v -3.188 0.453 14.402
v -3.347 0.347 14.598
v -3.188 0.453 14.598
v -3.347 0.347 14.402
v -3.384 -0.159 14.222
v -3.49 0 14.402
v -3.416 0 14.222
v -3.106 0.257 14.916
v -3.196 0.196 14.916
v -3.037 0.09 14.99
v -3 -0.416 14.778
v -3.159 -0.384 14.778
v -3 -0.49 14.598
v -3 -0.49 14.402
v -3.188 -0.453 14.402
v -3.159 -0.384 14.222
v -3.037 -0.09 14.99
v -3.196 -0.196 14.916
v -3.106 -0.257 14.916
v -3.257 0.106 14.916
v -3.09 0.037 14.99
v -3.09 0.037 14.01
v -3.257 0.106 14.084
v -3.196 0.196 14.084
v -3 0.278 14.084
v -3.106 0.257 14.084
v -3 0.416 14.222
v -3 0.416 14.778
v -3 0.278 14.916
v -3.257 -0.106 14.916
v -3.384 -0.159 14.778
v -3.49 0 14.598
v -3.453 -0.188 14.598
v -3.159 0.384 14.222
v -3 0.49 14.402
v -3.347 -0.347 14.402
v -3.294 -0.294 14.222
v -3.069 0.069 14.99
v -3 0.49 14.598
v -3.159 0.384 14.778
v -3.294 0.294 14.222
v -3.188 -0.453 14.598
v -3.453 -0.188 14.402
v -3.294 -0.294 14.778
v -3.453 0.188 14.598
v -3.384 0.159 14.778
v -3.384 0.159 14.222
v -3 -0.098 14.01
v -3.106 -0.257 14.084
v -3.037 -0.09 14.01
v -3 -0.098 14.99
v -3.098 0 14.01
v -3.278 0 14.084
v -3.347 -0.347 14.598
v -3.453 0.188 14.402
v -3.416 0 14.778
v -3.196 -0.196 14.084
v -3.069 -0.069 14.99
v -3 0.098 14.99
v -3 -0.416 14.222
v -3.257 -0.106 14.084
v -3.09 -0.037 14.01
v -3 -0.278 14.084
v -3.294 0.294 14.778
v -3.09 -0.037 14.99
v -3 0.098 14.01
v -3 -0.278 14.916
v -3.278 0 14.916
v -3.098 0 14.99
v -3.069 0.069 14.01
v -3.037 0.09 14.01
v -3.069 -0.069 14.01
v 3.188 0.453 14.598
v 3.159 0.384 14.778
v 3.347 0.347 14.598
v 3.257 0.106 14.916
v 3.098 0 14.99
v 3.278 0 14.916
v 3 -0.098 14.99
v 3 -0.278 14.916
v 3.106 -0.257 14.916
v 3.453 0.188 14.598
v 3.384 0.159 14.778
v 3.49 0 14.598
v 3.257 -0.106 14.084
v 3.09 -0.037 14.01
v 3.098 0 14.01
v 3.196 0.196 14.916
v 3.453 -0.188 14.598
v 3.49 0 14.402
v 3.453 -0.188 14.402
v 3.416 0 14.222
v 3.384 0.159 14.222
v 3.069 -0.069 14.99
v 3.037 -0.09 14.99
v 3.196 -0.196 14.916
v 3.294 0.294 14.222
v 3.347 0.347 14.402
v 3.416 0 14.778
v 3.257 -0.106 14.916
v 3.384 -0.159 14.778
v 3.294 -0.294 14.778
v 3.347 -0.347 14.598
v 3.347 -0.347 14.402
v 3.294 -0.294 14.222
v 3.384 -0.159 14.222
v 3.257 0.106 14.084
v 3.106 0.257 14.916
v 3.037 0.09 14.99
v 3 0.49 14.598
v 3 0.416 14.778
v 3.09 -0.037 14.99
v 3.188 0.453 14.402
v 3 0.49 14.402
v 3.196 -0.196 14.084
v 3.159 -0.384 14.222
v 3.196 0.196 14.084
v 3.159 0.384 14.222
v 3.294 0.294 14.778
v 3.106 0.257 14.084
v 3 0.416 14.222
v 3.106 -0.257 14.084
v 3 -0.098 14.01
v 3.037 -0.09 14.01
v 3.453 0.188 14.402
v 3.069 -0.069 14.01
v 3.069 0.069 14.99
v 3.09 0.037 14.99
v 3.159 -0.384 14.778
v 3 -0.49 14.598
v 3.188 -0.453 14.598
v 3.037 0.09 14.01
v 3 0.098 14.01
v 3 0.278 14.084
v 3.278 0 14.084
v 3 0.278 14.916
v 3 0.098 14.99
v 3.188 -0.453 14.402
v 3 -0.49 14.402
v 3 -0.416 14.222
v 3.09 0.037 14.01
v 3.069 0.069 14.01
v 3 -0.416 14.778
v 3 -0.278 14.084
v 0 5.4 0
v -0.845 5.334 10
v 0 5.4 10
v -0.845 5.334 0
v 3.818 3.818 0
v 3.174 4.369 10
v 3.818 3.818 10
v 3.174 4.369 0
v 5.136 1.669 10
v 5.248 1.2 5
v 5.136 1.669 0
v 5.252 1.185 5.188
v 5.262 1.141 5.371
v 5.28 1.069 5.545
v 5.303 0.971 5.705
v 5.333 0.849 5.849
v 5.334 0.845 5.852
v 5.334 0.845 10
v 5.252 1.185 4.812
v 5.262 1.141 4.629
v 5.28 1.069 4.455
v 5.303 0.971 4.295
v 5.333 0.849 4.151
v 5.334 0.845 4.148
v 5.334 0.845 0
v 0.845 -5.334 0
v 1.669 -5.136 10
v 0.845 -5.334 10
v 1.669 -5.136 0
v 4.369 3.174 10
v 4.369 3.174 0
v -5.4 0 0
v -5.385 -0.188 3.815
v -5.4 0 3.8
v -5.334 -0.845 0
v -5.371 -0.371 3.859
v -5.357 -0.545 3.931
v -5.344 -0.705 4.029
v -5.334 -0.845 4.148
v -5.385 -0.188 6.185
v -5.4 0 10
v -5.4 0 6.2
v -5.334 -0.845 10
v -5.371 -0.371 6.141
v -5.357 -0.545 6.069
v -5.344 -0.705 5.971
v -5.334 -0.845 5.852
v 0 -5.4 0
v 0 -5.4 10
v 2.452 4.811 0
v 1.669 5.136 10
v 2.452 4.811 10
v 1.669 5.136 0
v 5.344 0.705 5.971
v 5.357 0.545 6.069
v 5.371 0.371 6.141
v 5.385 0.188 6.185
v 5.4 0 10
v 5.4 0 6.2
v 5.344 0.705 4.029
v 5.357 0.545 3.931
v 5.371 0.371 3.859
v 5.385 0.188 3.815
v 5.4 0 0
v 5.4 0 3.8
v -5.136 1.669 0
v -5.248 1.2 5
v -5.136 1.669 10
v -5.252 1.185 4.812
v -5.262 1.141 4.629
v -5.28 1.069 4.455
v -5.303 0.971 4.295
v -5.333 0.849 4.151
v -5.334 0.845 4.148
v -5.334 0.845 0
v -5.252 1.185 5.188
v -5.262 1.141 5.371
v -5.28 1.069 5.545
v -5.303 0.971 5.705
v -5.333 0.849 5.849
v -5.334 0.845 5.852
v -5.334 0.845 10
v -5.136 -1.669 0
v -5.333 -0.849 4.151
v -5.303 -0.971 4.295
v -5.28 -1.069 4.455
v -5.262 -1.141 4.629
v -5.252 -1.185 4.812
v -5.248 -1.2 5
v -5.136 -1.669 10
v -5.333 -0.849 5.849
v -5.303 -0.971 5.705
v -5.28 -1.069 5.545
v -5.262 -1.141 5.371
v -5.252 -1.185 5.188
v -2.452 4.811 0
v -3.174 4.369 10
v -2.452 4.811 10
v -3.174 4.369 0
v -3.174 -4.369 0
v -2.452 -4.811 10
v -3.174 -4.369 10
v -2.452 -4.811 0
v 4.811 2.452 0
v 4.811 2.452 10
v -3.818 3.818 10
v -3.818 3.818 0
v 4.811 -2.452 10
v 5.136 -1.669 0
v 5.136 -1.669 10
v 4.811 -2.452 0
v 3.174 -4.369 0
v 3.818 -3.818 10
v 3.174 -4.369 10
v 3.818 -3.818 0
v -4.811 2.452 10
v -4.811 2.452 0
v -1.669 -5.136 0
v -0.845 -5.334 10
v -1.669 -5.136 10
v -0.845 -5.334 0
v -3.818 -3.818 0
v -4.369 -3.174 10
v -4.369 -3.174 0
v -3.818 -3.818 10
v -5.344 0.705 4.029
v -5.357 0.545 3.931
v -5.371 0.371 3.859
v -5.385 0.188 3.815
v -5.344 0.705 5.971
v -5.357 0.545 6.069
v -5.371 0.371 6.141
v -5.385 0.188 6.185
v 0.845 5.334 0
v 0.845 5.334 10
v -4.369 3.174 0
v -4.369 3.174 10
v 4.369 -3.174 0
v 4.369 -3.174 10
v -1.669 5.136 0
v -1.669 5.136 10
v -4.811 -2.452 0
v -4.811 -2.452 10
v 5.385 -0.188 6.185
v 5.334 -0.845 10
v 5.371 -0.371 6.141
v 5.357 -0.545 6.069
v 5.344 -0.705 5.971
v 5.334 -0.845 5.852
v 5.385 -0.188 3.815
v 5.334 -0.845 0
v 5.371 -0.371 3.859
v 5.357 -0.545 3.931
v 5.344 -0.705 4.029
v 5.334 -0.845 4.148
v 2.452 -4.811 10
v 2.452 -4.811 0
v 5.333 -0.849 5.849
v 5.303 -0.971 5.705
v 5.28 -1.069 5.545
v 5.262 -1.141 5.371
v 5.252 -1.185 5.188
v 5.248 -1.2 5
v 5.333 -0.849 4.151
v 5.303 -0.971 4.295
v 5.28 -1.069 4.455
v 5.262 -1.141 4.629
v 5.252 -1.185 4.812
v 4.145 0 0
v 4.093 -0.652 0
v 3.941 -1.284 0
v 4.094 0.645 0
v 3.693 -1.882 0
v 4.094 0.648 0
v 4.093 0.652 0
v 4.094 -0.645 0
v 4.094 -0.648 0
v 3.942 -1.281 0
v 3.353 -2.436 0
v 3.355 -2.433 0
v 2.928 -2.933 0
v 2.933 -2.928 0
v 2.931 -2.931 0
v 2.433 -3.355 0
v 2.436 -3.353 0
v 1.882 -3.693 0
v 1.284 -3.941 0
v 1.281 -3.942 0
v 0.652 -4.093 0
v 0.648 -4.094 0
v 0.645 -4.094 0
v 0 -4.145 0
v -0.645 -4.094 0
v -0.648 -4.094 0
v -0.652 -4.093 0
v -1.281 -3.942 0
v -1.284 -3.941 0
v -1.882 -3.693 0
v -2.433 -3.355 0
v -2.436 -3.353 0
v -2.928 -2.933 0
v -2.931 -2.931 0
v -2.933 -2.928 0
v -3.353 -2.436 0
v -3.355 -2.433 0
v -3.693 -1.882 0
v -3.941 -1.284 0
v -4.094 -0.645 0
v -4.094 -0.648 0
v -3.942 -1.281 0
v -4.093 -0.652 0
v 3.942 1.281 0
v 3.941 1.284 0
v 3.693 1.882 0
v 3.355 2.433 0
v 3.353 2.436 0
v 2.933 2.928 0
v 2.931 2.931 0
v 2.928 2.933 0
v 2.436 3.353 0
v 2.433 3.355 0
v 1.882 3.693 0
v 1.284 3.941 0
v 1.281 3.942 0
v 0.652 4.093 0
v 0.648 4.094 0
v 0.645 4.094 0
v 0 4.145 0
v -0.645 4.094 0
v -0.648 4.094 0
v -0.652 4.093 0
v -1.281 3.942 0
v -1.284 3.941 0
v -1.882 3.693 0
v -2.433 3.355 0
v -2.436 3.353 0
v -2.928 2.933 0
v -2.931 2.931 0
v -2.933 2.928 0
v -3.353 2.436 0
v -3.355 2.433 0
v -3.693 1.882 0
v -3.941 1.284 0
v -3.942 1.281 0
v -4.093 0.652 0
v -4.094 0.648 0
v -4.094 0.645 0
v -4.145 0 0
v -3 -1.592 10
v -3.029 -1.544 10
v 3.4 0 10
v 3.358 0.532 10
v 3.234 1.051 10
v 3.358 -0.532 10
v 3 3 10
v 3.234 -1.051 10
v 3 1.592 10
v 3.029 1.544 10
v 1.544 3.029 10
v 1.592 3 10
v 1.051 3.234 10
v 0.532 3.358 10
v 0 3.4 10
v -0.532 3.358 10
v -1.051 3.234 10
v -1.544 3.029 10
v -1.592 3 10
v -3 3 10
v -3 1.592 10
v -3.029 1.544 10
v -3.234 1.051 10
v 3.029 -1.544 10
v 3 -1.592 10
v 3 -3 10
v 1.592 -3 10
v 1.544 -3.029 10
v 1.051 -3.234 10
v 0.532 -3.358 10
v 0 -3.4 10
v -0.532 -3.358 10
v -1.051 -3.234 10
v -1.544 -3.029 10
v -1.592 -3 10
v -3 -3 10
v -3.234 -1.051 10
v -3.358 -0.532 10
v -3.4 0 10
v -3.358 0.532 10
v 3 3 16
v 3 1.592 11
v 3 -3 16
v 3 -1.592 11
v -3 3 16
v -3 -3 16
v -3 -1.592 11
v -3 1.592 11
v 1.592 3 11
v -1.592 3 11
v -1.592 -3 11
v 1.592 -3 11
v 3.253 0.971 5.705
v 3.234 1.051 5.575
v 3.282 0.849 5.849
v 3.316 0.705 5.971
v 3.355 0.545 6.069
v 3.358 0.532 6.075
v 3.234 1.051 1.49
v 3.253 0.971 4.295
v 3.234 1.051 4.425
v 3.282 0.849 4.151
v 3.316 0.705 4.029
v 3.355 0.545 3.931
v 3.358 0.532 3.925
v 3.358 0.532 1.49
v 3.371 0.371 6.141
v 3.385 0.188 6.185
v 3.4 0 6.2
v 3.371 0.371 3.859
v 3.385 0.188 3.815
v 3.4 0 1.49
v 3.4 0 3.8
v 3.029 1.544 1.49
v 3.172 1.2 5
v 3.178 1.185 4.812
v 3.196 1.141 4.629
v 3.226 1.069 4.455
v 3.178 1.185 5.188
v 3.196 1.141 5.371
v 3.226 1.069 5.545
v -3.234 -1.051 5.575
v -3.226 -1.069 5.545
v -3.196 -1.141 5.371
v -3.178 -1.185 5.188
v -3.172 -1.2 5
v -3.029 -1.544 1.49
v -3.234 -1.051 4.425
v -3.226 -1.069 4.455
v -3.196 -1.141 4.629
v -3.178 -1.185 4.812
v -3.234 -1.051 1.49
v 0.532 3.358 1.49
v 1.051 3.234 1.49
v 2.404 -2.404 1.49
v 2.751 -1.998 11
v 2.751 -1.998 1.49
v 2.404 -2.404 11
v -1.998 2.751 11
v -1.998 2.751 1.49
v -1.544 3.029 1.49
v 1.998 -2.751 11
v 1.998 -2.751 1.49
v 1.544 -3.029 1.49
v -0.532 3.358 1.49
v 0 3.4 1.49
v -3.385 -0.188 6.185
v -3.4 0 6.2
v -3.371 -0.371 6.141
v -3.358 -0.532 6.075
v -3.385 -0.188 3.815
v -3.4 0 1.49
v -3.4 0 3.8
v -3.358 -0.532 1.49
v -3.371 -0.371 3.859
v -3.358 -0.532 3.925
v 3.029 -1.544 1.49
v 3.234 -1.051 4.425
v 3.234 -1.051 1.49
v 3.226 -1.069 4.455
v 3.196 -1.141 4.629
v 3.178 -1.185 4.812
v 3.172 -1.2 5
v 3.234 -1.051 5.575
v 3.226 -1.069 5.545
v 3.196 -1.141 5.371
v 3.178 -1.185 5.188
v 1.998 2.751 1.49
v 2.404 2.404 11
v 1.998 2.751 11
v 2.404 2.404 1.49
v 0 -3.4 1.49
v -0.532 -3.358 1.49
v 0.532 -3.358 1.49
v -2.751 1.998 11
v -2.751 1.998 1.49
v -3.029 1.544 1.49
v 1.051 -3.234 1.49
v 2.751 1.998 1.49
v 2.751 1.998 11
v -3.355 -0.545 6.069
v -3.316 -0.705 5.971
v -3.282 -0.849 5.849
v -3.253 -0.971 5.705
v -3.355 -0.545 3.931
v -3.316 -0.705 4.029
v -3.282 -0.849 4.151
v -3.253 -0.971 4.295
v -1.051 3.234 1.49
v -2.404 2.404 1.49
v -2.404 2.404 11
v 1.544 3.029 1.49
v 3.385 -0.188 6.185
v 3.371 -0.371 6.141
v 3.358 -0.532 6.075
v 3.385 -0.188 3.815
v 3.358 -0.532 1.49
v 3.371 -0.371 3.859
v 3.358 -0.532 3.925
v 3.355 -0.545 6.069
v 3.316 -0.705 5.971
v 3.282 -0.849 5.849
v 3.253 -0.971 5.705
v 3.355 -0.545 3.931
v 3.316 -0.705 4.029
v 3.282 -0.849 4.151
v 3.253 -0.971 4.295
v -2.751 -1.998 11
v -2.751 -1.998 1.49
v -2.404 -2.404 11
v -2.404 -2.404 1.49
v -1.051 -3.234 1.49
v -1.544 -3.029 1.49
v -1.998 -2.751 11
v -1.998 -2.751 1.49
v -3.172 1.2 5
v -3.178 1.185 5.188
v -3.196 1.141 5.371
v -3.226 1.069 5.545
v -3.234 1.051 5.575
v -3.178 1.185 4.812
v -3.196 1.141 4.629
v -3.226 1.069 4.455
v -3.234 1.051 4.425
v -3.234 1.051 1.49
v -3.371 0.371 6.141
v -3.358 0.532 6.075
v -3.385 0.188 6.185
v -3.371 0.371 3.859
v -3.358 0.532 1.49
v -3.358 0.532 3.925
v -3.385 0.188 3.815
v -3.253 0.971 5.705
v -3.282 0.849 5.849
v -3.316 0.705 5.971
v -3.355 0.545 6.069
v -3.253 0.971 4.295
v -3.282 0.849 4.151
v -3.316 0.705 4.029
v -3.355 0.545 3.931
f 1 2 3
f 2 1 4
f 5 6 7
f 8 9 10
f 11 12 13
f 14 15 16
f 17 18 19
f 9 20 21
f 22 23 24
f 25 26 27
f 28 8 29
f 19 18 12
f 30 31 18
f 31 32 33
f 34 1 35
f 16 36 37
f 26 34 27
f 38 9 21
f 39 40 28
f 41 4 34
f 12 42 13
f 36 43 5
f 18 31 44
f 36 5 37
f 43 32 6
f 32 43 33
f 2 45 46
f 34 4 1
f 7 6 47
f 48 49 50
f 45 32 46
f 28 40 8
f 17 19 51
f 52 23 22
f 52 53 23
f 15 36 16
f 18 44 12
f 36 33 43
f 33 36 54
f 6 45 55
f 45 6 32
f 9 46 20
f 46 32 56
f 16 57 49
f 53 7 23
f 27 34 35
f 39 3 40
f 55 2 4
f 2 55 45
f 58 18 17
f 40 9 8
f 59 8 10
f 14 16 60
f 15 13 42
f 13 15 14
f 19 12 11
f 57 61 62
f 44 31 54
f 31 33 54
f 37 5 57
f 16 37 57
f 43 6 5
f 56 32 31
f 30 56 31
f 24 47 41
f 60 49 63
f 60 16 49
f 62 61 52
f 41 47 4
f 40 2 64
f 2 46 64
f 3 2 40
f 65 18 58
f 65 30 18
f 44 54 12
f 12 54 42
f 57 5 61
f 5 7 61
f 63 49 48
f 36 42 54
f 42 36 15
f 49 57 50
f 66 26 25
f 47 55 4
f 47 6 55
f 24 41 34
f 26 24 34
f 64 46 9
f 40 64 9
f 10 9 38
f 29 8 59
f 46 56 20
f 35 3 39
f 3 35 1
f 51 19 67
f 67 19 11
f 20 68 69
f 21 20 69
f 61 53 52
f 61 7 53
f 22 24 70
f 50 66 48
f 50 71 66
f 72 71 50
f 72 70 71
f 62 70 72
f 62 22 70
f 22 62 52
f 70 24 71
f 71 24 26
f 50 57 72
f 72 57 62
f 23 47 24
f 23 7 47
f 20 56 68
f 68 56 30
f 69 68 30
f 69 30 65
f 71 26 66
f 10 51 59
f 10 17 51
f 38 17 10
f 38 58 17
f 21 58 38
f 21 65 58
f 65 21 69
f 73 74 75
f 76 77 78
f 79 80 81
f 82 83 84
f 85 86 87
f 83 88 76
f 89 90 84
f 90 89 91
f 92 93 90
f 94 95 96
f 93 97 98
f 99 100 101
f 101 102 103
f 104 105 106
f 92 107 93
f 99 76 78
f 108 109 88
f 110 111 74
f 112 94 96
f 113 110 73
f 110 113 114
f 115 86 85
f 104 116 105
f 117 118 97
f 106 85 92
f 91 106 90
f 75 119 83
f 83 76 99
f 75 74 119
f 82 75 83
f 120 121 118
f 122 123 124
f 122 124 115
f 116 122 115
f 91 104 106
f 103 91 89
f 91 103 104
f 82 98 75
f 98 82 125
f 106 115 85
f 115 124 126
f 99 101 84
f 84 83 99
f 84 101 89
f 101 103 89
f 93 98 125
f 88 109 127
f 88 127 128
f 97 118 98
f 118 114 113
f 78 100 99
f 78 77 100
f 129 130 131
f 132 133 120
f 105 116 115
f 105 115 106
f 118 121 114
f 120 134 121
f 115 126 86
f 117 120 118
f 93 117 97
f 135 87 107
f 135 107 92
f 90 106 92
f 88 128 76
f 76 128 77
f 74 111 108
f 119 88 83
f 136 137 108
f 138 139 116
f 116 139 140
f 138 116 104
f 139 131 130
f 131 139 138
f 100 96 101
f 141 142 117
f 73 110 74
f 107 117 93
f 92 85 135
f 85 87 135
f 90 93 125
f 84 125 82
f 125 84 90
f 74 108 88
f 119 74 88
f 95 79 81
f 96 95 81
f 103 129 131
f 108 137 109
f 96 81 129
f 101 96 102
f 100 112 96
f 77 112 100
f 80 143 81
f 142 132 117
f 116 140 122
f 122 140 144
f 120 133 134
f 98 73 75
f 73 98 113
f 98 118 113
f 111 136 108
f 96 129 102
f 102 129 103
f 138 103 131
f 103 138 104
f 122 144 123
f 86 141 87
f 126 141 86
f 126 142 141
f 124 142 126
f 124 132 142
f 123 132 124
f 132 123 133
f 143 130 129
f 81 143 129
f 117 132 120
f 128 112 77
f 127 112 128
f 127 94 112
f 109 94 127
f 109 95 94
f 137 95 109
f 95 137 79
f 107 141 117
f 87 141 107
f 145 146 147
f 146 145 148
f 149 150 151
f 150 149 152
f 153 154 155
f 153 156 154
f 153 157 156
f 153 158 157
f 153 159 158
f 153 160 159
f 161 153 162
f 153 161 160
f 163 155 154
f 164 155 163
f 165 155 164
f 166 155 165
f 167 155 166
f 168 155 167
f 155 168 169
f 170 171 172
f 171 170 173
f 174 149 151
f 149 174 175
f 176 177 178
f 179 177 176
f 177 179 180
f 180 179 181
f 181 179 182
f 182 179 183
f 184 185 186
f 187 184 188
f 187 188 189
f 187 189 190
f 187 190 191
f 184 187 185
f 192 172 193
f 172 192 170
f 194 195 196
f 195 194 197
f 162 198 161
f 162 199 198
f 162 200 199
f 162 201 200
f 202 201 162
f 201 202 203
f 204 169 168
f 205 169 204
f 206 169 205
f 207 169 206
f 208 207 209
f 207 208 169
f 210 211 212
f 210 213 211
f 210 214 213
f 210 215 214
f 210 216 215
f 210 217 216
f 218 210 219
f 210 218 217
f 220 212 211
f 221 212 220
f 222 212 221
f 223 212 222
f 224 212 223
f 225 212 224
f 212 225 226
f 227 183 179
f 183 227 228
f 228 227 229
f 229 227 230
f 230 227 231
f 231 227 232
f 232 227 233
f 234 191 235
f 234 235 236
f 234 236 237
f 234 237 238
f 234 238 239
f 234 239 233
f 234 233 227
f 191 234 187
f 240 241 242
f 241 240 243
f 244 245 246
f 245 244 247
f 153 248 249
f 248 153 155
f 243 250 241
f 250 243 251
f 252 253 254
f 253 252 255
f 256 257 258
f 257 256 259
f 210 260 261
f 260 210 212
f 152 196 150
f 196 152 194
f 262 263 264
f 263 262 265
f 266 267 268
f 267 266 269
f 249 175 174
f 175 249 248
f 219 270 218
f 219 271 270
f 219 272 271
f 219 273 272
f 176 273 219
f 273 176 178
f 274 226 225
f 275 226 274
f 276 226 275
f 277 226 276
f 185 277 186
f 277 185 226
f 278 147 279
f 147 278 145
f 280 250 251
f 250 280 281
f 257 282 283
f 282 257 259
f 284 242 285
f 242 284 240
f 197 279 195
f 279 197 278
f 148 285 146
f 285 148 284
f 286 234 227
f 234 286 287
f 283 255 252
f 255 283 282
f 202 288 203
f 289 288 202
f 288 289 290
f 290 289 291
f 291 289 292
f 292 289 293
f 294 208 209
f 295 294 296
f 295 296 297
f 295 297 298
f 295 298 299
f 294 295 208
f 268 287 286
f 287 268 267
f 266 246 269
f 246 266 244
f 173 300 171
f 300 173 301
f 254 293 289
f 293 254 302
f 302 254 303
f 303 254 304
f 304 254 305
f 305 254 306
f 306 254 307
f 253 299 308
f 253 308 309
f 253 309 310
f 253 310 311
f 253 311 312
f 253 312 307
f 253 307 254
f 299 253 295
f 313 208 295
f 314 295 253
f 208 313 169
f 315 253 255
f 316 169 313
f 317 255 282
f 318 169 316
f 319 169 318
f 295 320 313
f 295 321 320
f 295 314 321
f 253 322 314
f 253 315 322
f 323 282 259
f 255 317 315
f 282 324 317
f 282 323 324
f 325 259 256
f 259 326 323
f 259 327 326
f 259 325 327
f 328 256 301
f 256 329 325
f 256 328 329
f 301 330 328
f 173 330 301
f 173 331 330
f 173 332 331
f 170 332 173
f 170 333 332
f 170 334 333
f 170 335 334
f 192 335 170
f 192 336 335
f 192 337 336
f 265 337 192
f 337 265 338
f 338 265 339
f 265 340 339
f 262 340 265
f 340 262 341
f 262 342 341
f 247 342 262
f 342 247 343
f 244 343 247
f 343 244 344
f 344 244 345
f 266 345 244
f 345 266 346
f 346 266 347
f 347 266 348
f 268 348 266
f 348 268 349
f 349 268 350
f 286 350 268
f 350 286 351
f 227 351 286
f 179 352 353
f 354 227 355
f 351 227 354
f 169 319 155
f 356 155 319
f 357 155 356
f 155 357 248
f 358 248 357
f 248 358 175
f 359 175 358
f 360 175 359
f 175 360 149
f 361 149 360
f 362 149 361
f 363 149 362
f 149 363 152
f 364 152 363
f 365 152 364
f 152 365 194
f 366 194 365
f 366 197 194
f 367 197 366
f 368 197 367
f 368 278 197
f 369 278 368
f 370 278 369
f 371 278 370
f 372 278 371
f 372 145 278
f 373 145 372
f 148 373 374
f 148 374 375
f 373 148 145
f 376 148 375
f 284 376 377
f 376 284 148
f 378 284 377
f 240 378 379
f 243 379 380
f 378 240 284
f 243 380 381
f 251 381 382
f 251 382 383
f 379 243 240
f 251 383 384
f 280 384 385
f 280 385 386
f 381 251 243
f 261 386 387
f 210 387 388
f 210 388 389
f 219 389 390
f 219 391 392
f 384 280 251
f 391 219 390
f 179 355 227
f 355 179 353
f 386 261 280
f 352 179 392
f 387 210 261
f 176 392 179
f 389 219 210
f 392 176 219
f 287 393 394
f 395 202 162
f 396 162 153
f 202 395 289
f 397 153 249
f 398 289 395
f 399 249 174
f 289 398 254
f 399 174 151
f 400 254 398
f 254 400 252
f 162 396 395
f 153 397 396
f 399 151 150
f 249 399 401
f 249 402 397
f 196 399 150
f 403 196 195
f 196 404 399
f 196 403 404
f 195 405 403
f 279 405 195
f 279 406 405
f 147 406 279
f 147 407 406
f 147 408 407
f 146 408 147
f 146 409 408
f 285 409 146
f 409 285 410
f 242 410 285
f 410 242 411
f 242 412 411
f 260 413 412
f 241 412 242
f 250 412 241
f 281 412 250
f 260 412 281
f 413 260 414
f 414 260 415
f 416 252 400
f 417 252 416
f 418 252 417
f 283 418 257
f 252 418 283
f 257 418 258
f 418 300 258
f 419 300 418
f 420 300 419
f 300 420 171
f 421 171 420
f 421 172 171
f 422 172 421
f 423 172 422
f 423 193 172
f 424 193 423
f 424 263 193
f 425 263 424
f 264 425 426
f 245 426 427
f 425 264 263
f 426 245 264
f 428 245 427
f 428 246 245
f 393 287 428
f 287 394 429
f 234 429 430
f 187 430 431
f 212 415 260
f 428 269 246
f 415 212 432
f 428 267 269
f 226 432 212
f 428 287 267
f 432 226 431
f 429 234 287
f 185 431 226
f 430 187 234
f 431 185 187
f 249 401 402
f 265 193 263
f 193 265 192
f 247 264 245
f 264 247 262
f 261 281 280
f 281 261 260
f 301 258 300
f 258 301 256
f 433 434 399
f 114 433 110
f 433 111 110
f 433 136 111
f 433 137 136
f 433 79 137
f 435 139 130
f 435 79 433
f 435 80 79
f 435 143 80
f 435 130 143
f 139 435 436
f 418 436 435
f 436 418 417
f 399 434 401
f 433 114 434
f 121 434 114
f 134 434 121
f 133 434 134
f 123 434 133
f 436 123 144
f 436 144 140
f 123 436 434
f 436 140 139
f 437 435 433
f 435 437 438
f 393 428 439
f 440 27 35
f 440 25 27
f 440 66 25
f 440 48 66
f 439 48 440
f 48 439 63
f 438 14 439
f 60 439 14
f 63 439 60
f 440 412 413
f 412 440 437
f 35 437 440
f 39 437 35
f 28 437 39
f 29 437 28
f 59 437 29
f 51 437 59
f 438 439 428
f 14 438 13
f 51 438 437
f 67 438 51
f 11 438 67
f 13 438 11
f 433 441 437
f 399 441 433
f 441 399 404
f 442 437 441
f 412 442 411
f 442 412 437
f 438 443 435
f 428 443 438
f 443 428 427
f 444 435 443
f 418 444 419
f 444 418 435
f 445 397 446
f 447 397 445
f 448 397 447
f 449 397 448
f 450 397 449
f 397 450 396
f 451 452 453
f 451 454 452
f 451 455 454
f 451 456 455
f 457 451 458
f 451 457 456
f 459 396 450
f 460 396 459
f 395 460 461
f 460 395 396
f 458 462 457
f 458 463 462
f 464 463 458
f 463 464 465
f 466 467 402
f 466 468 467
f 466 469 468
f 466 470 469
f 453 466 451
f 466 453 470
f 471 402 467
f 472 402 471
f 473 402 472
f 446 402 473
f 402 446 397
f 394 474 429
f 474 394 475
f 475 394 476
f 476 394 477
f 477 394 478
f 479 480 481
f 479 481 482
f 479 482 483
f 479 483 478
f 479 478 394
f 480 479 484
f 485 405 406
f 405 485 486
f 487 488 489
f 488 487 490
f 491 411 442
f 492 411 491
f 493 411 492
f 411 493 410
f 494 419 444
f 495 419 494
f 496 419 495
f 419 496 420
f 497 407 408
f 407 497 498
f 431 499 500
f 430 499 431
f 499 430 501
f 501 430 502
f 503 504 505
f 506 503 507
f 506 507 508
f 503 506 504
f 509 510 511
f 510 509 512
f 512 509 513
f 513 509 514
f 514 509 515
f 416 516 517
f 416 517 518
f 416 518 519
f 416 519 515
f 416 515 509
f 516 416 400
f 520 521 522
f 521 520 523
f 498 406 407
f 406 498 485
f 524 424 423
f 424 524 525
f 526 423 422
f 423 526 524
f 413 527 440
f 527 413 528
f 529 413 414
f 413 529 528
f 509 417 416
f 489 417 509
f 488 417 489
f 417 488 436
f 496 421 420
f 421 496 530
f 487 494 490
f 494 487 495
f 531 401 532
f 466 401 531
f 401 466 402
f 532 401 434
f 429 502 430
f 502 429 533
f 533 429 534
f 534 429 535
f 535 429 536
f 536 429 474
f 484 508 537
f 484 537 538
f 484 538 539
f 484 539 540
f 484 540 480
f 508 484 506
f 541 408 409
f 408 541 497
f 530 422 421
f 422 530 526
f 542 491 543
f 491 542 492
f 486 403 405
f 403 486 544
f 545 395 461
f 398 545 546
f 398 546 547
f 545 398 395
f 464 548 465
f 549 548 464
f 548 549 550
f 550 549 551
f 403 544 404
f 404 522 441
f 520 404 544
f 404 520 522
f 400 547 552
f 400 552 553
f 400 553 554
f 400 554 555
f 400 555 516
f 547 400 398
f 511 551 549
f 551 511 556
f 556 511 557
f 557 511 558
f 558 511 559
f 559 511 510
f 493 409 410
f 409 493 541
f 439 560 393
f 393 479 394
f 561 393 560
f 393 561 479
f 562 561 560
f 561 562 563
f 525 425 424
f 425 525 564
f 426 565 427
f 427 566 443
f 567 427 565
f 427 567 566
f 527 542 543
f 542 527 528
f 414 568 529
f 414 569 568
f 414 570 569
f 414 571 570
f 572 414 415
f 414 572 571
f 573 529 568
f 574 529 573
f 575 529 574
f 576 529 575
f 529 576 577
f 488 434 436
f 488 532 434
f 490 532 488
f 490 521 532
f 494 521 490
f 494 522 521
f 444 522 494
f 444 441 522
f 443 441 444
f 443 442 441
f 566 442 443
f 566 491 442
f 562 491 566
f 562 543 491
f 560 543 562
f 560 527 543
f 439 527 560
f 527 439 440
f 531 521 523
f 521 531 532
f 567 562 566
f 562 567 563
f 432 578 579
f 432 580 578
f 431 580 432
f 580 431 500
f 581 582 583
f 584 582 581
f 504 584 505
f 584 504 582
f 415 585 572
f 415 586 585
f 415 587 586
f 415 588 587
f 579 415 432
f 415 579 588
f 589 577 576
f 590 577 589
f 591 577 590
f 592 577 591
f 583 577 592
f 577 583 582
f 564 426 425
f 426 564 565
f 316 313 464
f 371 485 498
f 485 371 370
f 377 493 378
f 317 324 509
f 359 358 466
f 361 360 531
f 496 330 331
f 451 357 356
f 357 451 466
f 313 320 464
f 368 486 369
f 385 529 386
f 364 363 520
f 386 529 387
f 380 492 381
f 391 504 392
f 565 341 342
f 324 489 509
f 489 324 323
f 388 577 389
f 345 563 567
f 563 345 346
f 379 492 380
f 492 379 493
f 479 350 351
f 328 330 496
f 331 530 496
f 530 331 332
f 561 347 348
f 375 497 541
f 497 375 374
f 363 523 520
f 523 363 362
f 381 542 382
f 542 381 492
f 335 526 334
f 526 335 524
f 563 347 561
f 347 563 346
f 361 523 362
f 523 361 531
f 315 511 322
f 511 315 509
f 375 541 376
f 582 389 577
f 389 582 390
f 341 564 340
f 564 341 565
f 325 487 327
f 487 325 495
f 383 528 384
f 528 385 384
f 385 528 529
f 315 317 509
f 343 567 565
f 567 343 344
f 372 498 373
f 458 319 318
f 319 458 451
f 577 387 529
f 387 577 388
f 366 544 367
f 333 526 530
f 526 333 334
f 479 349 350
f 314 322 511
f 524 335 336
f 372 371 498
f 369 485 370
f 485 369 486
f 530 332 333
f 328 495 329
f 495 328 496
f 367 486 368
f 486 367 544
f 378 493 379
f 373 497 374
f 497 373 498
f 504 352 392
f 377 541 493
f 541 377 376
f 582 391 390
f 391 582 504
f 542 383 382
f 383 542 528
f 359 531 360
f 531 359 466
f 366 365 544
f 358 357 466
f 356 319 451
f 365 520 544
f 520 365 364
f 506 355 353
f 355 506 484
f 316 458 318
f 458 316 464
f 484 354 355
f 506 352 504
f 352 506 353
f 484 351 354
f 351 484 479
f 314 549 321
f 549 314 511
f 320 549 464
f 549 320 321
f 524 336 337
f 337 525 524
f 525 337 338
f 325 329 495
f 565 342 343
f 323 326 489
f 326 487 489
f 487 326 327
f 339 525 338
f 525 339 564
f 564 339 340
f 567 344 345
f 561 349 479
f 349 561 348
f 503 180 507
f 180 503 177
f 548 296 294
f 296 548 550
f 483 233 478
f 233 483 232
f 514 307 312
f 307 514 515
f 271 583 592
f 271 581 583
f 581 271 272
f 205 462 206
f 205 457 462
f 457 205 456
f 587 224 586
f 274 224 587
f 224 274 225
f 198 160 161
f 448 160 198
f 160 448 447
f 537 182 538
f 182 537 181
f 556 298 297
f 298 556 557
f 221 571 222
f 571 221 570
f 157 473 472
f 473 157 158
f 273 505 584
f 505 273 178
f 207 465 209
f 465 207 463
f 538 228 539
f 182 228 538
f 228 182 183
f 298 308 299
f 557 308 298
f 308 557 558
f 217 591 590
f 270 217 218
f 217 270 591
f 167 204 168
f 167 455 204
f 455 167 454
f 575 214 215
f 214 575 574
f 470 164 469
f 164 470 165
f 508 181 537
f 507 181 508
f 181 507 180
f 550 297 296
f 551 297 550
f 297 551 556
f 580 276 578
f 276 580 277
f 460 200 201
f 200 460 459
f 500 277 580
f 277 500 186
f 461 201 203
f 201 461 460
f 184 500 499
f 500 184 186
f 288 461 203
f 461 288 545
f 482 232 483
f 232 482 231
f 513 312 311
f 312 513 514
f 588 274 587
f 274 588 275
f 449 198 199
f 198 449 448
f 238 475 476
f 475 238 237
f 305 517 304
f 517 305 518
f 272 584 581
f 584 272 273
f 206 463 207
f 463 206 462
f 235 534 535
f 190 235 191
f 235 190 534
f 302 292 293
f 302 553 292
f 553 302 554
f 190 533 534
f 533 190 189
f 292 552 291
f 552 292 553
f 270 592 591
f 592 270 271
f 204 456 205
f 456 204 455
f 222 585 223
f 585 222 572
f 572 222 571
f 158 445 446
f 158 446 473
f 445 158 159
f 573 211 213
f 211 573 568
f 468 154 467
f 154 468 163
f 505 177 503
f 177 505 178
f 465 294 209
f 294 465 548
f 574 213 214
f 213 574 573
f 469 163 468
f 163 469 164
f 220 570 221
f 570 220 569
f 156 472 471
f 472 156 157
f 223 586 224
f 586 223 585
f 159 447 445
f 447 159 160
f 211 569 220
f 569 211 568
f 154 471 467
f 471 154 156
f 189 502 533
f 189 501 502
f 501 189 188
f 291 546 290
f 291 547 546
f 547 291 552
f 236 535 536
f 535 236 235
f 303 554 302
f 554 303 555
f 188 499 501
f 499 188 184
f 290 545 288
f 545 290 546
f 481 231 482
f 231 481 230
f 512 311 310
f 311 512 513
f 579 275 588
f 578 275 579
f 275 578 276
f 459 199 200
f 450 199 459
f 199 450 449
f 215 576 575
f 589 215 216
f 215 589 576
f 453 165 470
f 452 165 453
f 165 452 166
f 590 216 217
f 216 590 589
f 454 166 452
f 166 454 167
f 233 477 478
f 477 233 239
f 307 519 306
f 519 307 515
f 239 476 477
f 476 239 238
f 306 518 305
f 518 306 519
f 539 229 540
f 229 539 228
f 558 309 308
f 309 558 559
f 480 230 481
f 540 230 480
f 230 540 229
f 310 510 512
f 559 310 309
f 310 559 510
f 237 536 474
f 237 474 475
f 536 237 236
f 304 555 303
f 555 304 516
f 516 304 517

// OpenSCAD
// file: tower_sheave.scad
// ====================================================================
// Tower End Sheave Wheel (100% 3D-Printable - Flat on Bed at Z = 0)
// Used at Tower A and Tower B.
// - High flanges to retain cable line securely.
// - 5mm central bore: spins on an M4/M5 bolt in Phase 1;
//   directly accepts a NEMA 17 D-shaft in Phase 2 (includes M3 grub screw hole).
// ====================================================================

$fn = 60;

// Dimensions (mm) - Scaled to 1/3 size (reduced size by 2/3rd)
sheave_outer_dia = 18.0; // Outer flange diameter [scaled from 54mm]
sheave_pitch_dia = 14.67;// Cable track diameter [scaled from 44mm]
sheave_width     = 4.0;  // Total sheave rim width [scaled from 8mm]
hub_h            = 6.0;  // Extended center hub [scaled from 12mm]
bore_dia         = 5.2;  // 5mm motor shaft / M5 screw clearance
grub_screw_dia   = 3.0;  // M3 set/grub screw for Phase 2 motor lock
hub_lift         = (hub_h - sheave_width) / 2; // 1.0mm standoff from bed


module tower_sheave() {
    difference() {
        union() {
            // Main sheave disc (lifted by hub standoff)
            translate([0, 0, hub_lift])
                cylinder(d = sheave_outer_dia, h = sheave_width);
            // Extended center hub (starts at Z = 0)
            cylinder(d = 14.0, h = hub_h);
        }
        
        // Center shaft bore
        translate([0, 0, -1])
            cylinder(d = bore_dia, h = hub_h + 2);
        
        // Deep cable groove
        translate([0, 0, hub_h / 2])
            rotate_extrude(convexity = 10) {
                translate([sheave_pitch_dia / 2, 0, 0])
                    polygon([
                        [-2.0, 0],
                        [6.0, 3.2],
                        [6.0, -3.2]
                    ]);
            }
        
        // Radial M3 grub screw hole (for clamping onto motor shaft in Phase 2)
        translate([0, 0, hub_h / 2])
            rotate([90, 0, 0])
                cylinder(d = grub_screw_dia, h = 20, center = false);
            
        // Decorative weight-reduction spoke cutouts (holiday snowflake / star style)
        for (a = [0 : 60 : 300]) {
            rotate([0, 0, a])
                translate([16, 0, -1])
                    cylinder(d = 8, h = hub_h + 2);
        }
    }
}

// Render flat on bed at Z = 0
tower_sheave();
// file: tower_head_station_a.scad
// ====================================================================
// Tower Head Station A: Drive-Ready Station (100% 3D-Printable)
// 
// Dual-Role Design:
// - Phase 1: Mounts a passive sheave wheel on an M5 bolt axle.
// - Phase 2: Directly bolts to a NEMA 17 stepper motor (4x M3 holes on 31mm centers)
//   without needing any modifications or reprints!
// Bottom has a 20mm socket to mount onto a wooden dowel, PVC pipe, or printed truss.
// ====================================================================

use <tower_sheave.scad>;

$fn = 40;

// Dimensions - Scaled to 1/3 envelope size (reduced size by 2/3rd)
bracket_w        = 15.33; // Width of mounting face [scaled from 46mm]
bracket_h        = 17.33; // Height of mounting plate [scaled from 52mm]
plate_th         = 3.0;   // Thickness of plate [scaled from 6mm]
nema17_hole_dist = 10.33; // Scaled motor mounting hole spacing [scaled from 31mm]
nema17_pilot_d   = 7.67;  // Scaled center collar clearance [scaled from 23mm]
m3_hole_d        = 2.2;   // Bolt clearance for 1/3 scale motor mount
socket_inner_d   = 6.8;   // Fits scaled mast/dowel [scaled from 20.4mm]
socket_wall      = 2.0;   // Socket wall thickness
socket_depth     = 10.0;  // Socket depth [scaled from 25mm]



// ====================================================================
// Part A: Lower Mast Socket (Sits 100% flat on build plate at Z=0)
// Includes top square post with snap-fit locking tabs
// ====================================================================
module tower_head_a_socket() {
    difference() {
        union() {
            // Main cylindrical mast socket
            cylinder(d = socket_inner_d + (socket_wall * 2), h = socket_depth);
            
            // Upper square snap post (plugs into the Upper Bracket)
            translate([0, 0, socket_depth + 3.0])
                cube([6.0, 6.0, 6.0], center = true);

            // Friction snap detent nubs on sides of post
            for (x_sign = [-1, 1]) {
                translate([x_sign * 3.0, 0, socket_depth + 4.5])
                    sphere(r = 0.5, $fn = 16);
            }
        }

        // Mast socket cavity (bottom) with 45-degree self-aligning lead-in chamfer
        translate([0, 0, -1])
            cylinder(d = socket_inner_d, h = socket_depth + 2);
        translate([0, 0, -0.01])
            cylinder(d1 = socket_inner_d + 1.5, d2 = socket_inner_d, h = 1.5);

        // Mast cross-pin clamp hole
        translate([0, 0, socket_depth / 2])
            rotate([0, 90, 0])
                cylinder(d = 2.4, h = socket_inner_d + 6, center = true);
    }
}

// ====================================================================
// Part B: Upper Motor/Sheave Head Bracket (Laid 100% flat on plate at Z=0)
// Includes matching square receiving socket for snap fit
// ====================================================================
module tower_head_a_bracket() {
    difference() {
        union() {
            // Main vertical faceplate
            translate([0, 0, bracket_h / 2])
                cube([bracket_w, plate_th, bracket_h], center = true);

            // Overhead cable guide horn
            translate([0, 3.5, bracket_h - 1.5])
                cube([bracket_w, 7.0 + plate_th, 3.0], center = true);

            // Lower snap-fit receiving hub (rests flat at Z = 0)
            translate([0, 3.5, 3.0])
                cube([10.0, 8.0, 6.0], center = true);
        }

        // Center pilot hole (for axle bolt or motor collar)
        translate([0, 0, bracket_h * 0.55])
            rotate([90, 0, 0])
                cylinder(d = nema17_pilot_d, h = plate_th + 4, center = true);

        // 4x Motor mounting holes
        for (dx = [-nema17_hole_dist / 2, nema17_hole_dist / 2]) {
            for (dz = [-nema17_hole_dist / 2, nema17_hole_dist / 2]) {
                translate([dx, 0, (bracket_h * 0.55) + dz])
                    rotate([90, 0, 0])
                        cylinder(d = m3_hole_d, h = plate_th + 4, center = true);
            }
        }

        // Cable path slot through the overhead horn
        translate([0, 3.5, bracket_h - 1.5])
            cube([6.5, 9.0, 5.0], center = true);

        // Receiving socket pocket for Part A post (includes +0.2mm print gap clearance)
        translate([0, 3.5, 3.0])
            cube([6.25, 6.25, 7.0], center = true);

        // Side snap-fit detent channels
        for (x_sign = [-1, 1]) {
            translate([x_sign * 3.1, 3.5, 4.5])
                sphere(r = 0.6, $fn = 16);
        }
    }
}

// 1-Piece Unified or Assembled helper
module tower_head_a() {
    tower_head_a_socket();
    translate([0, -3.5, socket_depth])
        tower_head_a_bracket();
}



// Visual preview with sheave wheel attached
module preview_station_a() {
    tower_head_a();
    #translate([0, plate_th / 2 + 8, bracket_h * 0.55])
        rotate([90, 0, 0])
            tower_sheave();
}

// ====================================================================
// Selection
// ====================================================================
// "print"      -> Upright resting flat on socket rim at Z = 0
// "print_flat" -> Laid flat on its rear motor plate at Z = 0 (ZERO supports!)
// "preview"    -> Upright with sheave wheel attached
mode = "print_flat";

if (mode == "print") {
    translate([0, 0, socket_depth])
        tower_head_a();
} else if (mode == "print_flat") {
    // Laid flat on rear face of motor plate at Z = 0
    translate([0, plate_th / 2, 0])
        rotate([-90, 0, 0])
            tower_head_a();
} else if (mode == "preview") {
    preview_station_a();
}
// main file
// ====================================================================
// [PRINT 06-A] Tower Station A - Lower Mast Socket
// Sits 100% flat on build plate at Z = 0.
// Includes square locking post with snap-fit retention nubs.
// ZERO SUPPORTS NEEDED!
// ====================================================================

use <tower_head_station_a.scad>;

$fn = 50;

// Centered on bed at Z = 0
tower_head_a_socket();
